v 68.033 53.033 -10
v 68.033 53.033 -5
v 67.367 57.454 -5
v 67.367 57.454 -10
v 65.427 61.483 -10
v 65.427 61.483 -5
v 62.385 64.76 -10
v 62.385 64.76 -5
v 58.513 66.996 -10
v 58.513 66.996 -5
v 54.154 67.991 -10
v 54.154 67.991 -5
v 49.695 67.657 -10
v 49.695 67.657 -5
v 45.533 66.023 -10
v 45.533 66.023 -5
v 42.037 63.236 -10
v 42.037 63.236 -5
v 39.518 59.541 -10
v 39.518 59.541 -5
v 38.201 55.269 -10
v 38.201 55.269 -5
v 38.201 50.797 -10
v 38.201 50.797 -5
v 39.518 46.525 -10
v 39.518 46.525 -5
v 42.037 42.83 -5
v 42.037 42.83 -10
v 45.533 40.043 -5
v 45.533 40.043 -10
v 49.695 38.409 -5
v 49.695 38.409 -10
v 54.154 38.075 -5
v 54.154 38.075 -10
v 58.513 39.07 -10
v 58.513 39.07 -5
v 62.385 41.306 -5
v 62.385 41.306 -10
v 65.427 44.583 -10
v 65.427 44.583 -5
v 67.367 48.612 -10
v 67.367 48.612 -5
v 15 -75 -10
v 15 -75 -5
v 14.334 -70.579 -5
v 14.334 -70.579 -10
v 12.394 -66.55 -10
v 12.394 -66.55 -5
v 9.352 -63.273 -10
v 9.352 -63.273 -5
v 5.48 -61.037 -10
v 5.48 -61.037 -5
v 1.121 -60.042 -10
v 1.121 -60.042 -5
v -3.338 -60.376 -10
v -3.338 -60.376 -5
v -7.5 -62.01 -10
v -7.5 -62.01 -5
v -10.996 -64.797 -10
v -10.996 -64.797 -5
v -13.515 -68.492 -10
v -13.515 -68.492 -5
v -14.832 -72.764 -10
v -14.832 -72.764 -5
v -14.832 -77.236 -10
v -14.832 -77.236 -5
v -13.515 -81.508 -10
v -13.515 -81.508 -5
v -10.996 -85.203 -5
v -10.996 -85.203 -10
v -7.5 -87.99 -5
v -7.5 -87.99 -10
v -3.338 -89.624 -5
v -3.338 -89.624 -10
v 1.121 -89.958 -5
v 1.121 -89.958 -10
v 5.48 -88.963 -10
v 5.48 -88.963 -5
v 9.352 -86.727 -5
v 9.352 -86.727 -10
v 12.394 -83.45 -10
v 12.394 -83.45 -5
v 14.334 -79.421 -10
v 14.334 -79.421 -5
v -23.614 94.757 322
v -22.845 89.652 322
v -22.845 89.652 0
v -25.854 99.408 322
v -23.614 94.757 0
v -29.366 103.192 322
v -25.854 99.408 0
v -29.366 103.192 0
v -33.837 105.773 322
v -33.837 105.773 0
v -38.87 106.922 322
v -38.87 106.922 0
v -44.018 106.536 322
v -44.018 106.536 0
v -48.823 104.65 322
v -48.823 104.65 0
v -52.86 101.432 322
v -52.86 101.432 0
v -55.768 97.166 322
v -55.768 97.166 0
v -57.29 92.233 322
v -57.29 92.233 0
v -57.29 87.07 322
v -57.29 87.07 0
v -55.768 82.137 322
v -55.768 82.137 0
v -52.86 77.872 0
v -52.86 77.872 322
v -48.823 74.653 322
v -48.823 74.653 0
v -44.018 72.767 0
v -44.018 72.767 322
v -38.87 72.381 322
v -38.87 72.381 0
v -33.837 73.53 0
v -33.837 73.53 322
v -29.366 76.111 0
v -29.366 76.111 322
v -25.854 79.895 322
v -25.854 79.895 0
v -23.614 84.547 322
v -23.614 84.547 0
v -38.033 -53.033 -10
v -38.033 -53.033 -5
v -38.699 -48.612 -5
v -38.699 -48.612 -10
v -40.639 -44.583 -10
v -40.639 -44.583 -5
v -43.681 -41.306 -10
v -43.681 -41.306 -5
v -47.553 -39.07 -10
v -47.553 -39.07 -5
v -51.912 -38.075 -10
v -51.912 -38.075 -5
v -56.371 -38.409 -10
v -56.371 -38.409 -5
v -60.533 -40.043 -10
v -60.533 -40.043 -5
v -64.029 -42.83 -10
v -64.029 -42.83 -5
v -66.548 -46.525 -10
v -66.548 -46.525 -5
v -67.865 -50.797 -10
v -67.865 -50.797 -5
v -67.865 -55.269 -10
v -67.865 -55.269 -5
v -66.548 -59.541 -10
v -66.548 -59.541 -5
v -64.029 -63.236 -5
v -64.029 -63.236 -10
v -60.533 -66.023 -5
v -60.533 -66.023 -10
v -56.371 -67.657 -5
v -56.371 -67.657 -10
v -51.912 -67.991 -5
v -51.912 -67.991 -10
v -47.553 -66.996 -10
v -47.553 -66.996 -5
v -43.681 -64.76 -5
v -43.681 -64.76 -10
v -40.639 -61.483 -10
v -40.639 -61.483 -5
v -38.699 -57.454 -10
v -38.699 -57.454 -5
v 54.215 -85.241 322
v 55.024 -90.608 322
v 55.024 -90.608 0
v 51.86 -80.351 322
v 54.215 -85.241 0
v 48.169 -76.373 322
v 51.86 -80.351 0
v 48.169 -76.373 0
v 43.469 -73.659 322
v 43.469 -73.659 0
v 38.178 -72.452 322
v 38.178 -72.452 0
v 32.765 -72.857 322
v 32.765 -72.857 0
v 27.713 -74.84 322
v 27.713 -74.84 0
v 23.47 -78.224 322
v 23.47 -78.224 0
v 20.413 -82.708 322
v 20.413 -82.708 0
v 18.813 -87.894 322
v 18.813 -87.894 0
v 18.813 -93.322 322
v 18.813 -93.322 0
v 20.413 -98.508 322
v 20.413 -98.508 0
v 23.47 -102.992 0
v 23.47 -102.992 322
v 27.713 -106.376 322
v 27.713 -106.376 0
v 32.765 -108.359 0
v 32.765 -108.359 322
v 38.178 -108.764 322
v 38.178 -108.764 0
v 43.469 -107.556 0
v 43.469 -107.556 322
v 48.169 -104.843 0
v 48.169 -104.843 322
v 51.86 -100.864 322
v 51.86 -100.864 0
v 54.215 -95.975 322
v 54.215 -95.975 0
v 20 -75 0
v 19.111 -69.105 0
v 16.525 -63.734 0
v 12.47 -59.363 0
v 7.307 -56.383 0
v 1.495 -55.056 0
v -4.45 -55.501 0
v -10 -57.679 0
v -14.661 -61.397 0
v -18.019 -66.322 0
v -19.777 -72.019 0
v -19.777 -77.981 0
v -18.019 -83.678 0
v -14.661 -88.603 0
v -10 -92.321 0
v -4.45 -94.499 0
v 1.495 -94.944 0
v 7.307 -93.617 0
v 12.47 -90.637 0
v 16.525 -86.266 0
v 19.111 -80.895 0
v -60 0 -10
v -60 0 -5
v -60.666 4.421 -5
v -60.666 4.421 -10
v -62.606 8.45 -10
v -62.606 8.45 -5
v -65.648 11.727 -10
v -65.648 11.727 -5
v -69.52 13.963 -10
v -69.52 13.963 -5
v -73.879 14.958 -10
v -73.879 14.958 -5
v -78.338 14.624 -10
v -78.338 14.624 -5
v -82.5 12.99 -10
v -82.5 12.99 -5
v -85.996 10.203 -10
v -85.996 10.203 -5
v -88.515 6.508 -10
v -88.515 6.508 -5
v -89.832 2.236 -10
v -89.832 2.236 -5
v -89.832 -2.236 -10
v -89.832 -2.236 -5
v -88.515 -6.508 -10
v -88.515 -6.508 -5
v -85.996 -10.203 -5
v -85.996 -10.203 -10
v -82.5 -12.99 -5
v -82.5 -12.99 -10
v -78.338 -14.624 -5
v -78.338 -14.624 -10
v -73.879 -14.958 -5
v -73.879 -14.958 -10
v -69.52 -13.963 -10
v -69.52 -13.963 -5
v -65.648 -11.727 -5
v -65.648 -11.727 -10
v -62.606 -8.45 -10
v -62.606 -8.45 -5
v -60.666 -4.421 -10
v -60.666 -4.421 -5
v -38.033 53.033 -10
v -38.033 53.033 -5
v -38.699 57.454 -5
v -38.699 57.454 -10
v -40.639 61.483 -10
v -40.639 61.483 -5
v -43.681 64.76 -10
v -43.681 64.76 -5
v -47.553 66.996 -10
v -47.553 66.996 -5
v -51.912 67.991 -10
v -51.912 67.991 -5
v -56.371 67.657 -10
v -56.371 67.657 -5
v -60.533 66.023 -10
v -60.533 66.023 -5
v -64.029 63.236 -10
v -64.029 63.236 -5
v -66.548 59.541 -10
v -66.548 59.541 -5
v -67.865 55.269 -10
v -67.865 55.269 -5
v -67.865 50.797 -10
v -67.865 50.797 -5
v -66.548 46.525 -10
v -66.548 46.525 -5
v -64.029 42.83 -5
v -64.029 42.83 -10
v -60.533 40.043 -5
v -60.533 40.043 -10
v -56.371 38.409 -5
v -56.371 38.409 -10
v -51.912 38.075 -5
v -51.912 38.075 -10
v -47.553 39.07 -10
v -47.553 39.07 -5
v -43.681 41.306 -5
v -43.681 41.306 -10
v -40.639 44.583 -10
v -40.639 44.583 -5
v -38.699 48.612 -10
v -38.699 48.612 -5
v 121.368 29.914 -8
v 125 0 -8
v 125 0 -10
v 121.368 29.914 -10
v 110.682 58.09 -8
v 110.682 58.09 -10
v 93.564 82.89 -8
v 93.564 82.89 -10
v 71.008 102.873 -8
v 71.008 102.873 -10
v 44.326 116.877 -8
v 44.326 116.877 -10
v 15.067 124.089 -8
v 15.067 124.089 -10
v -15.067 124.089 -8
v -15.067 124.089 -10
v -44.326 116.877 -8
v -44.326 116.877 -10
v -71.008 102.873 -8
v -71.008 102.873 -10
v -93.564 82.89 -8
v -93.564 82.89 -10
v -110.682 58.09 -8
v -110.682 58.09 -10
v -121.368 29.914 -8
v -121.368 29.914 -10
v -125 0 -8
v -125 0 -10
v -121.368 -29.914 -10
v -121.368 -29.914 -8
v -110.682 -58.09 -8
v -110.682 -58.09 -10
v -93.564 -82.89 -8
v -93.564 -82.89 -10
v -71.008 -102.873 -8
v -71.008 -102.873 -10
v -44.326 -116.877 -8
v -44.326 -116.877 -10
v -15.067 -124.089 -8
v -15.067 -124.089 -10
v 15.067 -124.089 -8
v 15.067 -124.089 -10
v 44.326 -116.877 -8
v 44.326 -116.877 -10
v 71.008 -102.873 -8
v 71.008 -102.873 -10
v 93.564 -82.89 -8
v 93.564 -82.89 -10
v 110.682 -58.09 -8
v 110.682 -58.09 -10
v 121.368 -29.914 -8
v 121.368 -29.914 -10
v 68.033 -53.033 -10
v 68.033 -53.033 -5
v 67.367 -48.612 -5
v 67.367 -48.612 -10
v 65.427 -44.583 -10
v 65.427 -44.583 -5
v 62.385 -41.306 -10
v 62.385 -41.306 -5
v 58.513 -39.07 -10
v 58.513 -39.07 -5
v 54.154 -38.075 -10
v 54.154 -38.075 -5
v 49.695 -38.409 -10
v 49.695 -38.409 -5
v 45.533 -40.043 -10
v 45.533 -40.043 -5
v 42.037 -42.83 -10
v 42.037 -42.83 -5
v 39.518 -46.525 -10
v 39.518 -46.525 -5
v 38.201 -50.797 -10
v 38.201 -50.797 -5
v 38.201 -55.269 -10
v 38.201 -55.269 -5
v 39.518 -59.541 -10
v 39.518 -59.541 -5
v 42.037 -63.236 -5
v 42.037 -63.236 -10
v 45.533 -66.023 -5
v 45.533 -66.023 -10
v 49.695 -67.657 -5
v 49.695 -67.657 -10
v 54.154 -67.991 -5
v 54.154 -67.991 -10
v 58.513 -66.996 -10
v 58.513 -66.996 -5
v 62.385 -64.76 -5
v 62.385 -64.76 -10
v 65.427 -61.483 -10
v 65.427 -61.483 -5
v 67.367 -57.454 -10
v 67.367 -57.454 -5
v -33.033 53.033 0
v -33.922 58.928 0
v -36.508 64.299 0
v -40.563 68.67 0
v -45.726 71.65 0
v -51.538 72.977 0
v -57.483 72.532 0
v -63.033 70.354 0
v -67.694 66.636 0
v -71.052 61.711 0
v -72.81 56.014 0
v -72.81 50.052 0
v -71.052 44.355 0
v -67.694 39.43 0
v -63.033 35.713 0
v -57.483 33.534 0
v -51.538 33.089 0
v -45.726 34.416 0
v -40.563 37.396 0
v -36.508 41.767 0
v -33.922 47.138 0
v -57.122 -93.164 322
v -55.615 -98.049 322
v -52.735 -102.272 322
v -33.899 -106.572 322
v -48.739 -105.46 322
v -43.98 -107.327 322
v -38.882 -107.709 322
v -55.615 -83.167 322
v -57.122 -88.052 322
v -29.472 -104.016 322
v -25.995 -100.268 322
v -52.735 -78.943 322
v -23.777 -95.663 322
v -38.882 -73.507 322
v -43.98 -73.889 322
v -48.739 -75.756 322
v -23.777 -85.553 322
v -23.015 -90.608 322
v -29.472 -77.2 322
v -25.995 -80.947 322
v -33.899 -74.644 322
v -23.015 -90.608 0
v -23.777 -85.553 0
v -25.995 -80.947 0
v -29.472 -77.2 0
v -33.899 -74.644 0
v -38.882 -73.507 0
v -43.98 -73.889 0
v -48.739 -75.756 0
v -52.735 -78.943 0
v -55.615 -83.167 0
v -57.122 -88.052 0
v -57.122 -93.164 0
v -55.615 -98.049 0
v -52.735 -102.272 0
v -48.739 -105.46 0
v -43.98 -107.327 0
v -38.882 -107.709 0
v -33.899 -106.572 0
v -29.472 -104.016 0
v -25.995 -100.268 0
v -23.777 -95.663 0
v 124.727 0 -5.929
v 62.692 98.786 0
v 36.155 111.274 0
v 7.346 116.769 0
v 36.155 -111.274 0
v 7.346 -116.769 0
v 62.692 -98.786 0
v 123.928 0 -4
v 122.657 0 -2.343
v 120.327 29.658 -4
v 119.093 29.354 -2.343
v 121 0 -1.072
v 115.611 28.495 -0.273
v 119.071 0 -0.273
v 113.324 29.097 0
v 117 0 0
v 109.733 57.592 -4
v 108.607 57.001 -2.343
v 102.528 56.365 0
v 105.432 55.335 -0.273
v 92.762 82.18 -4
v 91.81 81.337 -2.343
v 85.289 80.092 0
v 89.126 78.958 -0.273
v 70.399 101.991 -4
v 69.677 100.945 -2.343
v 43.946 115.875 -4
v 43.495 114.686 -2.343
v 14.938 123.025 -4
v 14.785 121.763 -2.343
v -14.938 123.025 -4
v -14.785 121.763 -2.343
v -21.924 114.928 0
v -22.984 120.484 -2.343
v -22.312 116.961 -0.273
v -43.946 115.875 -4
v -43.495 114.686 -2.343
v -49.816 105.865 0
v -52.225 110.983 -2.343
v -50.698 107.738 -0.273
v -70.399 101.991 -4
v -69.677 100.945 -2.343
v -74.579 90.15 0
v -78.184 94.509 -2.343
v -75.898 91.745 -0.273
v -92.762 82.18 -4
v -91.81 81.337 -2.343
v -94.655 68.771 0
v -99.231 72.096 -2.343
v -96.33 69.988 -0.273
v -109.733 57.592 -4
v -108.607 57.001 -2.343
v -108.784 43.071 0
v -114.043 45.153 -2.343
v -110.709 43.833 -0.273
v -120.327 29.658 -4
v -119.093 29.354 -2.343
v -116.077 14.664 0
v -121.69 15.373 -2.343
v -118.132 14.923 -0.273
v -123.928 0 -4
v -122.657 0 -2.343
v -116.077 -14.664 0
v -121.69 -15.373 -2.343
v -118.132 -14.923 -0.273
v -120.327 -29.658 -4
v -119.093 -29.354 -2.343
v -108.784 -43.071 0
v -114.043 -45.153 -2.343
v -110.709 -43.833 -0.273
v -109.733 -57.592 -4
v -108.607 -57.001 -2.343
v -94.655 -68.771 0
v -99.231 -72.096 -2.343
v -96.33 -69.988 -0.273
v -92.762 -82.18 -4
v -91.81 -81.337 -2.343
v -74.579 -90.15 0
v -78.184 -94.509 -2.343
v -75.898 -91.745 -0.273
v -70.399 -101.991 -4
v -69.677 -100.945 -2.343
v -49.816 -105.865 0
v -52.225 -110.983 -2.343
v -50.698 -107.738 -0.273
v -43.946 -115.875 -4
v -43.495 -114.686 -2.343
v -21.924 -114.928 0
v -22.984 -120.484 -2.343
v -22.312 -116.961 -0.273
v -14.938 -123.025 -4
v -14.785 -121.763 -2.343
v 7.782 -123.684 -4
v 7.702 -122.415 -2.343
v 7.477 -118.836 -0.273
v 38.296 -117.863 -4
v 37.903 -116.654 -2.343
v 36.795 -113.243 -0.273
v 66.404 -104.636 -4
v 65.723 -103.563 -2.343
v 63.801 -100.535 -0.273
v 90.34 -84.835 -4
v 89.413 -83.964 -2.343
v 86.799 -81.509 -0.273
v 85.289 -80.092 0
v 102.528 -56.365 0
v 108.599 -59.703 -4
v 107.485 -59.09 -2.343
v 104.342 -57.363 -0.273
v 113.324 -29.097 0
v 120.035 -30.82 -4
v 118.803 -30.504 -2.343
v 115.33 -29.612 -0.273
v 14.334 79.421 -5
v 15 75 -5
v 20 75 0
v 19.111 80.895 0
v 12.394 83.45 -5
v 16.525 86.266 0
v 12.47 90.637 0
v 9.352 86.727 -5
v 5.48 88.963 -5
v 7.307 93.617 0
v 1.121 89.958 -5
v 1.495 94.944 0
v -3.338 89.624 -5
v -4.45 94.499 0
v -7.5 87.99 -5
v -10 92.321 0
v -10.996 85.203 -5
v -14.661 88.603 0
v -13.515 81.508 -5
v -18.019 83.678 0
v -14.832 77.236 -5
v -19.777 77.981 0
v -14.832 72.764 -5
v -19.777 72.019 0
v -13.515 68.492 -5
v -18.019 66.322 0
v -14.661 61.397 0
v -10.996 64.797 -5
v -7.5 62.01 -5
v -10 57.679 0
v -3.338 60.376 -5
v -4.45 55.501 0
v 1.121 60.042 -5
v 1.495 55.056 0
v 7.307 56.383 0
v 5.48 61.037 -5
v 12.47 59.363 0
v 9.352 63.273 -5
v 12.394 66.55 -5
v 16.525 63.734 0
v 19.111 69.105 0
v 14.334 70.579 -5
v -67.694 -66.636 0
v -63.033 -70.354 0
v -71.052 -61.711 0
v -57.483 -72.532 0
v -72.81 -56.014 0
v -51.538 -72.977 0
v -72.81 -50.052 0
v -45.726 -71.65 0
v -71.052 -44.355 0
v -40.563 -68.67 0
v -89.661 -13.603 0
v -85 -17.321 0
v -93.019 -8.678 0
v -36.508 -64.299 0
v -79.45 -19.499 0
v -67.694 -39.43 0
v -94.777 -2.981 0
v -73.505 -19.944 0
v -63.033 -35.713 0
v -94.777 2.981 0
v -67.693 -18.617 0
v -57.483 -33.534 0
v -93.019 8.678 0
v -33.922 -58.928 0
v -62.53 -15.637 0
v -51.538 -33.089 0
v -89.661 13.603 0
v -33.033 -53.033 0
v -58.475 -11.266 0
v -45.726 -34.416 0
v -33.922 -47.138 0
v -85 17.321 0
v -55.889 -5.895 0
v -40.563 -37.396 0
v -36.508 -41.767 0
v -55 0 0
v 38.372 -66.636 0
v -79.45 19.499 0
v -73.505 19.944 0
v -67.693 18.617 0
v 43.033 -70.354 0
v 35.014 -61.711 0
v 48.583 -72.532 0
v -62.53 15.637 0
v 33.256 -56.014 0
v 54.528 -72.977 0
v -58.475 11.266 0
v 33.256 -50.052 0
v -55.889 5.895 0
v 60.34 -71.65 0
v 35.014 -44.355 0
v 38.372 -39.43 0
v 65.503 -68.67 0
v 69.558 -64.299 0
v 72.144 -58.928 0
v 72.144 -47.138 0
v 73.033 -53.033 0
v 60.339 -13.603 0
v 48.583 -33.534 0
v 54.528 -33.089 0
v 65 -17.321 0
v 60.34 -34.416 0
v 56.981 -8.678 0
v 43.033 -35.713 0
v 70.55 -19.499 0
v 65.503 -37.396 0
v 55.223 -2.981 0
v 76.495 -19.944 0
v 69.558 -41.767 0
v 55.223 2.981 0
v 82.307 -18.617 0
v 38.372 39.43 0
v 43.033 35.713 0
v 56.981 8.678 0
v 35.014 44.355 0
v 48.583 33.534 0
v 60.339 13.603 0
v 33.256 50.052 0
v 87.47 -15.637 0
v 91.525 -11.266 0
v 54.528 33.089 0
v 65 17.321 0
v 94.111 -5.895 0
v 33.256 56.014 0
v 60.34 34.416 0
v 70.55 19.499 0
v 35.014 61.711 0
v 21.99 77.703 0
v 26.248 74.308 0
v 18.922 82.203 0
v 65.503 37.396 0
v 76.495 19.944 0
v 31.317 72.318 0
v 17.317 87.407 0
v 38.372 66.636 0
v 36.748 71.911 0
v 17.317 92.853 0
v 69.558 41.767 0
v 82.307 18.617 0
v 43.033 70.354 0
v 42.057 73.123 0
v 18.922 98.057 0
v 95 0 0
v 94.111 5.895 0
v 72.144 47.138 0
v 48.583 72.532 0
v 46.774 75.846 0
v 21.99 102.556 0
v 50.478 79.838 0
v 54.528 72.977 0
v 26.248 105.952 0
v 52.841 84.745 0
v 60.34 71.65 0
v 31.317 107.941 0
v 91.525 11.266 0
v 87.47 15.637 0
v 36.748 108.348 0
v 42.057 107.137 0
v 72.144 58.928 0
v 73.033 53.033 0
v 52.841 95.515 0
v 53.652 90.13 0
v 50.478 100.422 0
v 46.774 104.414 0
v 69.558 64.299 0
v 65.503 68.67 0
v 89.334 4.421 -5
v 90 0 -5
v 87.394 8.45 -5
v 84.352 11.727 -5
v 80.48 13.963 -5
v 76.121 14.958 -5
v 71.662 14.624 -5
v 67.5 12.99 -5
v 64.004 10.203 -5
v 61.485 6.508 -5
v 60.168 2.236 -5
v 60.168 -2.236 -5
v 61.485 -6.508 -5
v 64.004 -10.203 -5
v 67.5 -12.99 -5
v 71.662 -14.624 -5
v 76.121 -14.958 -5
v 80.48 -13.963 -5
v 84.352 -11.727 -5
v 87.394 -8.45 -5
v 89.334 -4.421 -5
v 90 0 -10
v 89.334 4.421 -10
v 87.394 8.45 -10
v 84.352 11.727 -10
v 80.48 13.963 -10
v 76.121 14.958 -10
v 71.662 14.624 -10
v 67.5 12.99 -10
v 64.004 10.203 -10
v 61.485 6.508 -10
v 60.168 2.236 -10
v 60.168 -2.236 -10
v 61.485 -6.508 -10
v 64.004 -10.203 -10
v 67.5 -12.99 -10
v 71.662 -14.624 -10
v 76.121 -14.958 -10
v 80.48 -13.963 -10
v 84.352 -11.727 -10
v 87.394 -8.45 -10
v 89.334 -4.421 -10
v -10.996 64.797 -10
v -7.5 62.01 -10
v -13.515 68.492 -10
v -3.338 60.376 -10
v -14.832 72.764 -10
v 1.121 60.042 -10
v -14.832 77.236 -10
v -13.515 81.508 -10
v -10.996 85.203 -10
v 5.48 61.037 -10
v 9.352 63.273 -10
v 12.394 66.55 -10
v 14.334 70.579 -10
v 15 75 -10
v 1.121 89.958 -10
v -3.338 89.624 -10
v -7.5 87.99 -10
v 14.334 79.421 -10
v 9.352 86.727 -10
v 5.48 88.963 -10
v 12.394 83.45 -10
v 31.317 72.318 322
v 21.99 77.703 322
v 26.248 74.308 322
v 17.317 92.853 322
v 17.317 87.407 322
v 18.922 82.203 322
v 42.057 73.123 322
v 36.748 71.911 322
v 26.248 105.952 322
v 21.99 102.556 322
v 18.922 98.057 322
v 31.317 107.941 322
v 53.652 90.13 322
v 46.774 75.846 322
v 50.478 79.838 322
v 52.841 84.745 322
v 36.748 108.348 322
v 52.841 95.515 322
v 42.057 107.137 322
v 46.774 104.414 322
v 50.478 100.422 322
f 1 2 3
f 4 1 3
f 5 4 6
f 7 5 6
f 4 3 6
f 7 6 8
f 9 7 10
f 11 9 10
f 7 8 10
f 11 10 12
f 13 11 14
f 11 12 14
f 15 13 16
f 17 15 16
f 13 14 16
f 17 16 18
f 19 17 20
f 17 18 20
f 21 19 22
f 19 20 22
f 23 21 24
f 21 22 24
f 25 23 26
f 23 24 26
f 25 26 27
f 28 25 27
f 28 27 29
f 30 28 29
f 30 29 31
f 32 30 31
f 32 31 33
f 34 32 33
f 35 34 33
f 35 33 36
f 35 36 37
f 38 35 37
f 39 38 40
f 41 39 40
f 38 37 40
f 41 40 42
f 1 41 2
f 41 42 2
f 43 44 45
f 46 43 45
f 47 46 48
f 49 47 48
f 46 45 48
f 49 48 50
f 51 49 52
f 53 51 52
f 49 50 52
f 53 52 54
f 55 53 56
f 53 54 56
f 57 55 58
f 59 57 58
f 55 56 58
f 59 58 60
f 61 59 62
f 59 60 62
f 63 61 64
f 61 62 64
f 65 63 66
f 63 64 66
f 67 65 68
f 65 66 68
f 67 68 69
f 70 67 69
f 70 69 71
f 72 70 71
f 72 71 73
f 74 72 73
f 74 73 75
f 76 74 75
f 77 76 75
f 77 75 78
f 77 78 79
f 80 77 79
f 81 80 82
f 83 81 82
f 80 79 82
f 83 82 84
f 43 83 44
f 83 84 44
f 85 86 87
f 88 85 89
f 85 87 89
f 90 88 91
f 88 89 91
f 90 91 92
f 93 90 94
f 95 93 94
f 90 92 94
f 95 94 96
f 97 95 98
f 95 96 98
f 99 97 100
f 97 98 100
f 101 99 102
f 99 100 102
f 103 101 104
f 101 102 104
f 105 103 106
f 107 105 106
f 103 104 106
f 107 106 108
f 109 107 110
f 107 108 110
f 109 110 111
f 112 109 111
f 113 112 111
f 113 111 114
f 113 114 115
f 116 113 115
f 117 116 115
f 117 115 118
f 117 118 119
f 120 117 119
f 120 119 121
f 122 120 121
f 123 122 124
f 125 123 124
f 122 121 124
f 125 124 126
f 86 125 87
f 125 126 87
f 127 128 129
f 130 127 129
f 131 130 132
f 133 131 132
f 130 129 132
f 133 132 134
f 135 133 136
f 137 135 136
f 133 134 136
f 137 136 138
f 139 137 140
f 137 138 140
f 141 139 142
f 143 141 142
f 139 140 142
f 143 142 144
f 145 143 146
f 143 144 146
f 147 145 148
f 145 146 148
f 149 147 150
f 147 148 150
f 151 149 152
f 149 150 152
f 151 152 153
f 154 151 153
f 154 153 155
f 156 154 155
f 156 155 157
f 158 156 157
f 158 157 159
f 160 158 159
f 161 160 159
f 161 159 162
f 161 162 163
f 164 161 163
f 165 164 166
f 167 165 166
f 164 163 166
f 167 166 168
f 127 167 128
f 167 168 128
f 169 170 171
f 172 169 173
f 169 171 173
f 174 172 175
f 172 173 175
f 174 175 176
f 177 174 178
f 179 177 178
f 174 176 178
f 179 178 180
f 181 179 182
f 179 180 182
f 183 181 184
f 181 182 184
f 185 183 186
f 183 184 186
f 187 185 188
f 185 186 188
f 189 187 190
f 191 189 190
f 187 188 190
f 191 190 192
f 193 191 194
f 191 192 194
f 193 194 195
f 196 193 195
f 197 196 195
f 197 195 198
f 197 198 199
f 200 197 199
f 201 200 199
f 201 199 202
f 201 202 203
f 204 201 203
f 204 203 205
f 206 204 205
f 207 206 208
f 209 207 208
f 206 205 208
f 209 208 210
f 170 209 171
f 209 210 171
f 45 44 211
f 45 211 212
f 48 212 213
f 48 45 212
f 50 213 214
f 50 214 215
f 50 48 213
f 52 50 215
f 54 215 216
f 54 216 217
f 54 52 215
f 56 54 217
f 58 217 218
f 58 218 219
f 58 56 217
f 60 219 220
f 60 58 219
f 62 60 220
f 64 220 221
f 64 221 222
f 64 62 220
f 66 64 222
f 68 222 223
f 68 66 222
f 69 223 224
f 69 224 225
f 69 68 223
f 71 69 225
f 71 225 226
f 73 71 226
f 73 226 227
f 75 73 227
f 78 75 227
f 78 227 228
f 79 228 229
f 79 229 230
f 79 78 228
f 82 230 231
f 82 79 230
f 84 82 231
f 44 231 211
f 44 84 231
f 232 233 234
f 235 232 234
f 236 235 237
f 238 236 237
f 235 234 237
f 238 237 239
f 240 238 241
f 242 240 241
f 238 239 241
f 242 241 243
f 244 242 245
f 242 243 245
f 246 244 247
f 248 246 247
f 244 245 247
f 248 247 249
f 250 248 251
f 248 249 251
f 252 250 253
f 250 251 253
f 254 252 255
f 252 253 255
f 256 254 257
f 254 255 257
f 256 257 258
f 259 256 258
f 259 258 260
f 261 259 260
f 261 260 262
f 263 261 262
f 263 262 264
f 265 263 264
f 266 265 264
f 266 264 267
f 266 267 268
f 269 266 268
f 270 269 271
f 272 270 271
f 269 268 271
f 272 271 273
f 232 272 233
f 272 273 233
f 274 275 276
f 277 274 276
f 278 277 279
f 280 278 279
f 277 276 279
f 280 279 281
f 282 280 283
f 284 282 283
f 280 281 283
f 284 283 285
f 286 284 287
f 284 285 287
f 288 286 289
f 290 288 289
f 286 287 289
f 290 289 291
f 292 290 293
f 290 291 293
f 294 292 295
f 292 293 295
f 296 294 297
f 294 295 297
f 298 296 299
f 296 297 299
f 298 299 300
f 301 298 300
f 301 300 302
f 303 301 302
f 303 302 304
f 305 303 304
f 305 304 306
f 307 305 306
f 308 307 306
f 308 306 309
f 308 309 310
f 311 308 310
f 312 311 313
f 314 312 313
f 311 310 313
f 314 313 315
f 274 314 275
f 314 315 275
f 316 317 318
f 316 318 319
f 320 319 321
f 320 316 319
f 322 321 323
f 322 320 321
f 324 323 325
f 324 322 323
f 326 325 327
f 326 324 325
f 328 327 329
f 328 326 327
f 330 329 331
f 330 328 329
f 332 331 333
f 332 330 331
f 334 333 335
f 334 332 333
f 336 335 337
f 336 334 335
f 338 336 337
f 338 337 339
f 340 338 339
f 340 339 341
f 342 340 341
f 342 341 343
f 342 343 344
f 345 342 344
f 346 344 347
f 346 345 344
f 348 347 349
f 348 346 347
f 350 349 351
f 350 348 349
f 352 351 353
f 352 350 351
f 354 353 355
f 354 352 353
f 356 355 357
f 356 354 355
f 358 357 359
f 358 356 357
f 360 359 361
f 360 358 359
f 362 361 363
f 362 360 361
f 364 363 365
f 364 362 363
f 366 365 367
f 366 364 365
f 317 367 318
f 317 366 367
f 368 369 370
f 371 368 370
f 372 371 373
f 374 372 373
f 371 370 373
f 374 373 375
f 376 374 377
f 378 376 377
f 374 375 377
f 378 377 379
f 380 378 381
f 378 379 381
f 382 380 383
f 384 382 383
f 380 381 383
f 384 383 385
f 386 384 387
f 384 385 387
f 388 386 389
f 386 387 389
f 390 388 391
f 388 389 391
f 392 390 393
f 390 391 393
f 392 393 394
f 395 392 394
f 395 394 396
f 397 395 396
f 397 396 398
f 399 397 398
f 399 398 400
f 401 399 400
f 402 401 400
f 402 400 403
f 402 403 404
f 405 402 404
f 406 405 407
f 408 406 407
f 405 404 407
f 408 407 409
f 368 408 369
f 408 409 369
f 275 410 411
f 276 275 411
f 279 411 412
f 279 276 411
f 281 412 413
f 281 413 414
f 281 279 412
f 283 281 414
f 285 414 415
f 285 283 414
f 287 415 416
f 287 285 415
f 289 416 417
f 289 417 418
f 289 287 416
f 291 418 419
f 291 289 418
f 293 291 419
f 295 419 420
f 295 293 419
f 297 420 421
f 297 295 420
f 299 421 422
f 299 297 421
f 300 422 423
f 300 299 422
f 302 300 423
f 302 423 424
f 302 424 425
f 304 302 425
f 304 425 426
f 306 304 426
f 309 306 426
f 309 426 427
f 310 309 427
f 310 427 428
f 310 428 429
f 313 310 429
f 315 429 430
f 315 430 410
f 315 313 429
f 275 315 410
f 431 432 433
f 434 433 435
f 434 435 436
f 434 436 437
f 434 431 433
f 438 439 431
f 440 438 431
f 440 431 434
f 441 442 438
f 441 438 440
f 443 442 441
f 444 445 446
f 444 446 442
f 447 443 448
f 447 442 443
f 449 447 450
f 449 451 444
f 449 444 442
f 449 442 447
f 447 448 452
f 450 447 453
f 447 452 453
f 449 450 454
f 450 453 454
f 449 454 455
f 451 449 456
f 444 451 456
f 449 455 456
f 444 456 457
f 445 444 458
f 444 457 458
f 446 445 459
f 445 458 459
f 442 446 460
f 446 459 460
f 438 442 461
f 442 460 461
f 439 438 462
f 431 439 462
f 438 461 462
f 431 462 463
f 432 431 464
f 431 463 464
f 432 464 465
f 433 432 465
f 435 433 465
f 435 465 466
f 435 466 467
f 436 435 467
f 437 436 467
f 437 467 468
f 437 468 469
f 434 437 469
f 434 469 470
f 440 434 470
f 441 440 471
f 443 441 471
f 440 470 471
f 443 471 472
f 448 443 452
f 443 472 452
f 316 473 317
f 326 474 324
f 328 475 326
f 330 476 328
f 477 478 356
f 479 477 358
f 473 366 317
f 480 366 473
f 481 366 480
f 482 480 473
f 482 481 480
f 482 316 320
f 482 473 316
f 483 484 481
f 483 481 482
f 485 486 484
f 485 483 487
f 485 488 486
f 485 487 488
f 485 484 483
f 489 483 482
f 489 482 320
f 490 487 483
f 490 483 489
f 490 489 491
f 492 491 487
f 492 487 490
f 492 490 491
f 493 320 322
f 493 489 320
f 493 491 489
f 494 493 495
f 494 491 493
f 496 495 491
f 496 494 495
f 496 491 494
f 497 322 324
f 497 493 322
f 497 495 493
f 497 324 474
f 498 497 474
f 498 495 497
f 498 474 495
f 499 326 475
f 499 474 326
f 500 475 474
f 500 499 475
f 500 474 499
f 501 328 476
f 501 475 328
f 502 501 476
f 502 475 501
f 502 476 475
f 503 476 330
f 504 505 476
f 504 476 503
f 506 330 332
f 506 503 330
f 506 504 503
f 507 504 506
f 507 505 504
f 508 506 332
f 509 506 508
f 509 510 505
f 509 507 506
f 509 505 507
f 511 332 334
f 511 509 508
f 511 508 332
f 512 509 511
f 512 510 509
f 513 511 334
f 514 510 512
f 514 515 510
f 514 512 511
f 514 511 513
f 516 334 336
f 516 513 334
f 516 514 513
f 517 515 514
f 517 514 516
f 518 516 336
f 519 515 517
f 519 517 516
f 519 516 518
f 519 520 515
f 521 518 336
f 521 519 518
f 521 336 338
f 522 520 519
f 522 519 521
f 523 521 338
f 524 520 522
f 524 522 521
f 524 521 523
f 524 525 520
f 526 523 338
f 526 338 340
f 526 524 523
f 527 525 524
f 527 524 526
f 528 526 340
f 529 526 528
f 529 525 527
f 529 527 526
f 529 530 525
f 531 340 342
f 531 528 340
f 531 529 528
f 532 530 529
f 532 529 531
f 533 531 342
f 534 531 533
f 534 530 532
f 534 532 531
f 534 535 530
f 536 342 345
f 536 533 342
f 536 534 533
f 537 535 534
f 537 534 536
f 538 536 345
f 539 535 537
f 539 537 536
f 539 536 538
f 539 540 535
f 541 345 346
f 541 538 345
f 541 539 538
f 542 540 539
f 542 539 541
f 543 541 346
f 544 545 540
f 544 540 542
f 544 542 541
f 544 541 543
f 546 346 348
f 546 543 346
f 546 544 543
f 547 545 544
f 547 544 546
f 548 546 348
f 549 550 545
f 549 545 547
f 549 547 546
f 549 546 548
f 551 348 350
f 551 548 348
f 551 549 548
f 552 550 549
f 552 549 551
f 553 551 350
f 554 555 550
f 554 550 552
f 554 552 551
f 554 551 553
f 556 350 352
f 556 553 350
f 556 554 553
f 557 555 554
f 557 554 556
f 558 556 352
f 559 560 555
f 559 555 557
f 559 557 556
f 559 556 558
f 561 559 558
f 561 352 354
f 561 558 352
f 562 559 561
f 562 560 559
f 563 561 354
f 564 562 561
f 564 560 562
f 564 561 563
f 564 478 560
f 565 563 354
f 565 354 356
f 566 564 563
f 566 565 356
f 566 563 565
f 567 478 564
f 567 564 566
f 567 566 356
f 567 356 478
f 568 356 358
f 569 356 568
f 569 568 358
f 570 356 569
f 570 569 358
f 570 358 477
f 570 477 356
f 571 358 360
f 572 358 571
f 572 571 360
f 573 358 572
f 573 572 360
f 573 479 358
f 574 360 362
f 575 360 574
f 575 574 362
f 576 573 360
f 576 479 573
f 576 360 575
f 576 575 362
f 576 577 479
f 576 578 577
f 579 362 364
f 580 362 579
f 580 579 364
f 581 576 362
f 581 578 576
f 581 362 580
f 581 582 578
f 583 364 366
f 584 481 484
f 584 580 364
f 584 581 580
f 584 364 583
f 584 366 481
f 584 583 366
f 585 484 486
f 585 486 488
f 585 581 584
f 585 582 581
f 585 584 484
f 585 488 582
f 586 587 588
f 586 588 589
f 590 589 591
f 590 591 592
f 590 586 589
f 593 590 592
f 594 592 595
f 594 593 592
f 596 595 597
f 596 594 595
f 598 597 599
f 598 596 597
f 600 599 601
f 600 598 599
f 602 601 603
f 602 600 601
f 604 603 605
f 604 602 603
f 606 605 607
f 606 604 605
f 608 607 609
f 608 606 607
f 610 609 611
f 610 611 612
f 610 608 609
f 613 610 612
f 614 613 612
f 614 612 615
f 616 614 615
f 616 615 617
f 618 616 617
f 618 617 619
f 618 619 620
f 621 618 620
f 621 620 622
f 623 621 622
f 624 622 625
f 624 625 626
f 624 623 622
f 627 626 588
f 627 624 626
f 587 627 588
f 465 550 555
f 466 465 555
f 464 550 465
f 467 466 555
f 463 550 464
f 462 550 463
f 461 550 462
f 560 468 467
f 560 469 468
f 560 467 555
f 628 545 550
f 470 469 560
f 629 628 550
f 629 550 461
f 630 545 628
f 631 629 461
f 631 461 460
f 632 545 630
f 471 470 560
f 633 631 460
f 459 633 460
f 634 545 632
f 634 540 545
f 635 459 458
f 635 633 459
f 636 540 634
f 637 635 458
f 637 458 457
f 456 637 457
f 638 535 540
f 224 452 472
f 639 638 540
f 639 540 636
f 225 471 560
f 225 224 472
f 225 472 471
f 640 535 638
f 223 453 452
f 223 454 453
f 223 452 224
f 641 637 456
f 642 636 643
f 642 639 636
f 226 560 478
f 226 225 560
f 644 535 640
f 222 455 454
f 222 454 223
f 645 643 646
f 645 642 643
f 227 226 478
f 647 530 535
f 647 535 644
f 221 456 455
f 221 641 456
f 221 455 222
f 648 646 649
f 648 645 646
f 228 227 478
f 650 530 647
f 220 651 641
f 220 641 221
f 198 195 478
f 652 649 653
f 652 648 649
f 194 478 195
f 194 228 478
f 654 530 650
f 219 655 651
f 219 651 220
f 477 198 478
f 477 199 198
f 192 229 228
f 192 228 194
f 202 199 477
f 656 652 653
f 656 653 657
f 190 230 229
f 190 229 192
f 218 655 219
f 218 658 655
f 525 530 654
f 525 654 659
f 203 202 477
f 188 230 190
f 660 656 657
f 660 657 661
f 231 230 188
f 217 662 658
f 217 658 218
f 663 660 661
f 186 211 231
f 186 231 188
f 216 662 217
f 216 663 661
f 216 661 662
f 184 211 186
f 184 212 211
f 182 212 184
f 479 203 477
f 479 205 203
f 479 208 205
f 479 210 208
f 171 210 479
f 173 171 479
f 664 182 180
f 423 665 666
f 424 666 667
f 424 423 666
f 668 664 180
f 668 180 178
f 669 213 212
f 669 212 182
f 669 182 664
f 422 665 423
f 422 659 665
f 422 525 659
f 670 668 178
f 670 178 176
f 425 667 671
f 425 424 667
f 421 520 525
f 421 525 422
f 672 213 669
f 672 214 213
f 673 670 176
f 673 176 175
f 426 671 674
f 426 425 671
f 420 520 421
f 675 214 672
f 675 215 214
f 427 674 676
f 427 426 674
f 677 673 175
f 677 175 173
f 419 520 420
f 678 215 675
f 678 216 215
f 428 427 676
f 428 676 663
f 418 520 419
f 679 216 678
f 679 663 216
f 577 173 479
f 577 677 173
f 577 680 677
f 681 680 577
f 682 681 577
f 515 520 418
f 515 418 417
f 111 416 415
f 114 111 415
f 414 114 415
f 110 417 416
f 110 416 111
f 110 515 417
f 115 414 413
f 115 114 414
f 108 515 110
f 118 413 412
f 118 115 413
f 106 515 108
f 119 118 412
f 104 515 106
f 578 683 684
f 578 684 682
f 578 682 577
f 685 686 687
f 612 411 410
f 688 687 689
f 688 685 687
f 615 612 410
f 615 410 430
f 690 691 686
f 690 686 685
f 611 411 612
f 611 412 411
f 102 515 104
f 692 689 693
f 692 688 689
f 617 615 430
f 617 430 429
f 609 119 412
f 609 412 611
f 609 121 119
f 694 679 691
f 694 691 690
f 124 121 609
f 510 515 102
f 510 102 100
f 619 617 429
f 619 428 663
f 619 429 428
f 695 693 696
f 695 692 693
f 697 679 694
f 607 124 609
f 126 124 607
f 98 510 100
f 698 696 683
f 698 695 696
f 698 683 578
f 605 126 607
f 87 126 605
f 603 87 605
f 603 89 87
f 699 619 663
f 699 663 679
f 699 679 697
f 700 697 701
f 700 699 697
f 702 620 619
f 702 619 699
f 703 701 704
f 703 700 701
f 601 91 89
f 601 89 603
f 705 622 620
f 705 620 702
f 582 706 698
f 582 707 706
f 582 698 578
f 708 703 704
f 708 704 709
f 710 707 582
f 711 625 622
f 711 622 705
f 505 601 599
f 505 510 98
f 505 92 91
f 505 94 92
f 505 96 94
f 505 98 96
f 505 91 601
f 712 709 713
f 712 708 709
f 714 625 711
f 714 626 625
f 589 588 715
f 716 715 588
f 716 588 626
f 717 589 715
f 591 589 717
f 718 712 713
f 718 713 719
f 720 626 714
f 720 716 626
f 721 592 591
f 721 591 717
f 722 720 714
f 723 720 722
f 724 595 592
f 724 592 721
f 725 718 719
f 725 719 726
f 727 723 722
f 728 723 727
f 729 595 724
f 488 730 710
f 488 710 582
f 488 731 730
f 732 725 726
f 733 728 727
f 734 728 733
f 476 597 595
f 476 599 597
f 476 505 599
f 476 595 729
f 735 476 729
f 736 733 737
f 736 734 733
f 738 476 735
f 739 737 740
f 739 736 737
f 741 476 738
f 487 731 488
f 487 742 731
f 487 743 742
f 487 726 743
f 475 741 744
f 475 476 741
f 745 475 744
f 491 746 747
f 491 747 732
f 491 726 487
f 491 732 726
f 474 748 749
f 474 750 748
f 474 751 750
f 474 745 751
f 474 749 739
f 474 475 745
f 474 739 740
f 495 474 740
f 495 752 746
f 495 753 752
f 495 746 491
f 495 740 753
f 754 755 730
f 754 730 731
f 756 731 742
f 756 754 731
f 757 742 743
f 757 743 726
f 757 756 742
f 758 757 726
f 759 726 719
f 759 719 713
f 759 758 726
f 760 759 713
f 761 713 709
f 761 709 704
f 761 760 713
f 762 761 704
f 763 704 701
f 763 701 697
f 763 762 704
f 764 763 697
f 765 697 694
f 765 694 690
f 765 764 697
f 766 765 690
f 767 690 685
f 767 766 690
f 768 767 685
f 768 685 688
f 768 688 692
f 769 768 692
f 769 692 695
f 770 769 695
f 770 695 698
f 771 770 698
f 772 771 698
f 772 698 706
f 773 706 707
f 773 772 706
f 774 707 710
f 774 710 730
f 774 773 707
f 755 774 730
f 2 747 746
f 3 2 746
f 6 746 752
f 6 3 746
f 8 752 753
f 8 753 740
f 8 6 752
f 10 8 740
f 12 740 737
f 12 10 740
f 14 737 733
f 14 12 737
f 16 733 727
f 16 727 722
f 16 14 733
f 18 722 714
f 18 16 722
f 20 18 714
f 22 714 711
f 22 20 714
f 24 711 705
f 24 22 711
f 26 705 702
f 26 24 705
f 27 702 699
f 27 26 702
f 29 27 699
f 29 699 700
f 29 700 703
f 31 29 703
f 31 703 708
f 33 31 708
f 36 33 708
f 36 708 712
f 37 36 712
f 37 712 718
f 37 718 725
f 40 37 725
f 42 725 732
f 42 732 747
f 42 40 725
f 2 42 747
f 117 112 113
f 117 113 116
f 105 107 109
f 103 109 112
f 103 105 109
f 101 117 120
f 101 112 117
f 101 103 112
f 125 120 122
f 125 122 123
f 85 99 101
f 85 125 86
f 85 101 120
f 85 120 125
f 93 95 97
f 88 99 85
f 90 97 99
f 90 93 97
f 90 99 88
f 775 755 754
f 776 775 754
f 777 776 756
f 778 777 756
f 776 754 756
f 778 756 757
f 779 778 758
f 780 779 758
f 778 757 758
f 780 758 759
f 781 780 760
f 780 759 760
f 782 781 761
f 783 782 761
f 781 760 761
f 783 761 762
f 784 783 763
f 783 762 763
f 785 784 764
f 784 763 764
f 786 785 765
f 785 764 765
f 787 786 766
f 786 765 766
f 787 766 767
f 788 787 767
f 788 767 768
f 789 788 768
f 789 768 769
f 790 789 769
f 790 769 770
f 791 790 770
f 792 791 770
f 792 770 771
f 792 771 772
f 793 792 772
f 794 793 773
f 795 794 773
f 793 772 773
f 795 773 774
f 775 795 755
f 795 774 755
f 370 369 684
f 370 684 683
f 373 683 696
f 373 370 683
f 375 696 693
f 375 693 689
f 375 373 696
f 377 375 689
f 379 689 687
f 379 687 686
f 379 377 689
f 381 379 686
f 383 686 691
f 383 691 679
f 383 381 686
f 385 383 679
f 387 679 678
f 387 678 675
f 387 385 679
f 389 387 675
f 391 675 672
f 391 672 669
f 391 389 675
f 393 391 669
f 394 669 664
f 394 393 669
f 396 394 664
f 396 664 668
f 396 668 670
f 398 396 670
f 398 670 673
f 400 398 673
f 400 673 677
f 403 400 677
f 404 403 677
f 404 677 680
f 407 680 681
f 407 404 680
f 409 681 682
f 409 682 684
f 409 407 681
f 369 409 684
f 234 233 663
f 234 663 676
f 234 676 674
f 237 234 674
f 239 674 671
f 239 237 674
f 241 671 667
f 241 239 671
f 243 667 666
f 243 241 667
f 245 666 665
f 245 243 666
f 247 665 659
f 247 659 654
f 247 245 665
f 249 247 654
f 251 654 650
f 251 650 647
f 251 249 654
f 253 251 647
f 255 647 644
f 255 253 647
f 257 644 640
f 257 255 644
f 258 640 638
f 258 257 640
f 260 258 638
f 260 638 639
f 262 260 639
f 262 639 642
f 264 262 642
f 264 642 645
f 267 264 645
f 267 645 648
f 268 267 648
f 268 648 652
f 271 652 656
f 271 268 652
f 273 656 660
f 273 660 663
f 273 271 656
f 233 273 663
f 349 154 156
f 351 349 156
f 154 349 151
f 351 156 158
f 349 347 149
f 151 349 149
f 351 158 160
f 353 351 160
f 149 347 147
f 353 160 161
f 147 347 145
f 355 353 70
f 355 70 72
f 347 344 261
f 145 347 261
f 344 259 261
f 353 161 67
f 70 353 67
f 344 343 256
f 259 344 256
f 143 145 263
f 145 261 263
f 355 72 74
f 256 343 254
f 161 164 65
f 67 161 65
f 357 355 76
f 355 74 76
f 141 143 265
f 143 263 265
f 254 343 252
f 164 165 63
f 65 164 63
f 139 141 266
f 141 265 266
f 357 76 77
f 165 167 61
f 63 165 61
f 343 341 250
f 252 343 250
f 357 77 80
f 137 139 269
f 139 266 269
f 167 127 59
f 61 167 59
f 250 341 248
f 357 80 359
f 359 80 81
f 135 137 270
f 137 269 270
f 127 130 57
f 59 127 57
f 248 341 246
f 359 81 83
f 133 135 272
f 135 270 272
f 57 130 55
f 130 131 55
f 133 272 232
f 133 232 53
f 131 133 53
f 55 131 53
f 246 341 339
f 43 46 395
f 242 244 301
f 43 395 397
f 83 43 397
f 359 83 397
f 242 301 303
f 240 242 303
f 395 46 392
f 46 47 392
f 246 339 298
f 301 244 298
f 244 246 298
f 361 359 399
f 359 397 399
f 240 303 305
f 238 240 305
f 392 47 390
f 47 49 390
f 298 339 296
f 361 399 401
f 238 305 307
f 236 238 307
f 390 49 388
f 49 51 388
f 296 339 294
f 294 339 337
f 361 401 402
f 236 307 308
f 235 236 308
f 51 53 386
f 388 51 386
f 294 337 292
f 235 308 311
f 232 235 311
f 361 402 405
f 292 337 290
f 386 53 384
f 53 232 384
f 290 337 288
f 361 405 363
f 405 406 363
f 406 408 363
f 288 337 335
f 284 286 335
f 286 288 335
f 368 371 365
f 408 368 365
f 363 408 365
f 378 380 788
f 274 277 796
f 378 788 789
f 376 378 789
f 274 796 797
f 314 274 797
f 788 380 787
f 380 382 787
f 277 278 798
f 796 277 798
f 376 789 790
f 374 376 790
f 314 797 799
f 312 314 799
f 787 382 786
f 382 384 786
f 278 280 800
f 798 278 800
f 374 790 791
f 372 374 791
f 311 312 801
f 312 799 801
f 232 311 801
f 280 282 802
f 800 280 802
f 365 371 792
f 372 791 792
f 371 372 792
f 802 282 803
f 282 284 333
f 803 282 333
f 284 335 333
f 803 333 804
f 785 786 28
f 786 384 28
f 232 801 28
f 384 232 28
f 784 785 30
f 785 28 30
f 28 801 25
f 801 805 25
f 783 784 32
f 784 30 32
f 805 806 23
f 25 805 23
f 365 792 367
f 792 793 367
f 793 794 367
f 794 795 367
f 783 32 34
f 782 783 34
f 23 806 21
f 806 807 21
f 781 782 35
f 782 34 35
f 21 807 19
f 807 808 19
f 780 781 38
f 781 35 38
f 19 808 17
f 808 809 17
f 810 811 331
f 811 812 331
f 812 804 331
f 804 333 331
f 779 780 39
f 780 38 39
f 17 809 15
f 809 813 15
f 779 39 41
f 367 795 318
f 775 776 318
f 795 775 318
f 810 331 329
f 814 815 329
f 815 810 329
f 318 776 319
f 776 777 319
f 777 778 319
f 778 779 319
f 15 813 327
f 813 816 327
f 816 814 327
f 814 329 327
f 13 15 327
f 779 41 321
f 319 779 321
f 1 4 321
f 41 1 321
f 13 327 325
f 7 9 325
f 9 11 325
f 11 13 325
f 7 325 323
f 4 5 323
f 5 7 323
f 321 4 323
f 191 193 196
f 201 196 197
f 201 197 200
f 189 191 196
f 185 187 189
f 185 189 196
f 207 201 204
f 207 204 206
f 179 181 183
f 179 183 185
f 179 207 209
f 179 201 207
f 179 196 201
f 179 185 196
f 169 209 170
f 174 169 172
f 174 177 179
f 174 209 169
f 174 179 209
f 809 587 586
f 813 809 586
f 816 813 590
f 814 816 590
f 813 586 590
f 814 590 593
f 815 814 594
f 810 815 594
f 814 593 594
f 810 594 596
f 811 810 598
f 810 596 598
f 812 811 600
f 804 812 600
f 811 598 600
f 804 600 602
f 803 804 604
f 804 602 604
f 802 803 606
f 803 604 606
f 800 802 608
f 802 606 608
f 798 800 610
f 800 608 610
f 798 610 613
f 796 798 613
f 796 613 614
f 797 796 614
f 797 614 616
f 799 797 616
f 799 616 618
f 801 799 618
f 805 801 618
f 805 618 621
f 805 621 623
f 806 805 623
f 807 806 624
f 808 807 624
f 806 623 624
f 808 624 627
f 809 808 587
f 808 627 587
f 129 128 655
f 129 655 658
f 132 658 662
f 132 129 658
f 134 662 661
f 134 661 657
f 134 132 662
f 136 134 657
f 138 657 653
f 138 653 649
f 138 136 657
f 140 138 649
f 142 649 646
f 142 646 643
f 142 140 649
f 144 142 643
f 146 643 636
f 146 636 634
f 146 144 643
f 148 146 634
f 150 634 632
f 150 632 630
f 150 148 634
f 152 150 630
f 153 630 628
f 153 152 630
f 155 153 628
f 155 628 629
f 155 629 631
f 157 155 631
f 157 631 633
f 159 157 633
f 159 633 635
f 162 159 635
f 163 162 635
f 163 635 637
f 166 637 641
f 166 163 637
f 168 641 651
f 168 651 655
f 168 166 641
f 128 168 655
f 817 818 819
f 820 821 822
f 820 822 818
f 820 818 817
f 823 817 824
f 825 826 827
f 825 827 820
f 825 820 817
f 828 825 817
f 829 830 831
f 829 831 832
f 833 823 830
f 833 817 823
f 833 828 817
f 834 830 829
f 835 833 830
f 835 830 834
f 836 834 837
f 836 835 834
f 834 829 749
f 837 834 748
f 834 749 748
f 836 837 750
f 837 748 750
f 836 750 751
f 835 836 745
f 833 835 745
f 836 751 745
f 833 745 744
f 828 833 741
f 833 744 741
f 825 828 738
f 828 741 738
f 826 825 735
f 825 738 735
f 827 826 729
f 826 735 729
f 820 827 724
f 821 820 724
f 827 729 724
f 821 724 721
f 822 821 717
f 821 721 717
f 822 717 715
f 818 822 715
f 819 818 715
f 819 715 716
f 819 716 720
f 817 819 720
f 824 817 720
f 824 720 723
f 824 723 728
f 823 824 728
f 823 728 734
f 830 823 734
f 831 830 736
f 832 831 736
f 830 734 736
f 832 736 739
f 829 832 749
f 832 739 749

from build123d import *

# Parameters (mm, degrees)
F1_R     = 125
F1_R_2   = 15
F2_DEPTH = 10
F3_R     = 8
F4_SIZE  = 5
F5_R     = 17.149264
F5_R_2   = 18.207102
F5_R_3   = 18.26978
F5_R_4   = 17.319041
F6_DEPTH = 322


with BuildPart() as f2:
    # F1 (on face) → F2 (new body)
    with BuildSketch(Plane.XY):
        Circle(F1_R)
        with Locations((-53.033009, -53.033009)):
            Circle(F1_R_2, mode=Mode.SUBTRACT)
        with Locations((0, -75)):
            Circle(F1_R_2, mode=Mode.SUBTRACT)
        with Locations((53.033009, -53.033009)):
            Circle(F1_R_2, mode=Mode.SUBTRACT)
        with Locations((-75, 0)):
            Circle(F1_R_2, mode=Mode.SUBTRACT)
        with Locations((-53.033009, 53.033009)):
            Circle(F1_R_2, mode=Mode.SUBTRACT)
        with Locations((53.033009, 53.033009)):
            Circle(F1_R_2, mode=Mode.SUBTRACT)
        with Locations((75, 0)):
            Circle(F1_R_2, mode=Mode.SUBTRACT)
        with Locations((0, 75)):
            Circle(F1_R_2, mode=Mode.SUBTRACT)
    extrude(amount=-F2_DEPTH)

    # F3
    f3_edges = [f2.edges().sort_by_distance(p)[0] for p in [
        (-125, 0, 0),
    ]]
    fillet(f3_edges, radius=F3_R)

    # F4
    f4_edges = [f2.edges().sort_by_distance(p)[0] for p in [
        (-68.033009, 53.033009, 0),
        (-15, 75, 0),
        (-90, 0, 0),
        (38.033009, 53.033009, 0),
        (-68.033009, -53.033009, 0),
        (-15, -75, 0),
        (38.033009, -53.033009, 0),
        (60, 0, 0),
    ]]
    chamfer(f4_edges, length=F4_SIZE)

    # F5 (on face) → F6 (join)
    with BuildSketch(Plane.XY):
        with Locations((-40.163934, -90.607919)):
            Circle(F5_R)
        with Locations((36.81694, -90.607919)):
            Circle(F5_R_2)
        with Locations((35.382513, 90.129778)):
            Circle(F5_R_3)
        with Locations((-40.163934, 89.651637)):
            Circle(F5_R_4)
    extrude(amount=F6_DEPTH)


solid = f2.part
